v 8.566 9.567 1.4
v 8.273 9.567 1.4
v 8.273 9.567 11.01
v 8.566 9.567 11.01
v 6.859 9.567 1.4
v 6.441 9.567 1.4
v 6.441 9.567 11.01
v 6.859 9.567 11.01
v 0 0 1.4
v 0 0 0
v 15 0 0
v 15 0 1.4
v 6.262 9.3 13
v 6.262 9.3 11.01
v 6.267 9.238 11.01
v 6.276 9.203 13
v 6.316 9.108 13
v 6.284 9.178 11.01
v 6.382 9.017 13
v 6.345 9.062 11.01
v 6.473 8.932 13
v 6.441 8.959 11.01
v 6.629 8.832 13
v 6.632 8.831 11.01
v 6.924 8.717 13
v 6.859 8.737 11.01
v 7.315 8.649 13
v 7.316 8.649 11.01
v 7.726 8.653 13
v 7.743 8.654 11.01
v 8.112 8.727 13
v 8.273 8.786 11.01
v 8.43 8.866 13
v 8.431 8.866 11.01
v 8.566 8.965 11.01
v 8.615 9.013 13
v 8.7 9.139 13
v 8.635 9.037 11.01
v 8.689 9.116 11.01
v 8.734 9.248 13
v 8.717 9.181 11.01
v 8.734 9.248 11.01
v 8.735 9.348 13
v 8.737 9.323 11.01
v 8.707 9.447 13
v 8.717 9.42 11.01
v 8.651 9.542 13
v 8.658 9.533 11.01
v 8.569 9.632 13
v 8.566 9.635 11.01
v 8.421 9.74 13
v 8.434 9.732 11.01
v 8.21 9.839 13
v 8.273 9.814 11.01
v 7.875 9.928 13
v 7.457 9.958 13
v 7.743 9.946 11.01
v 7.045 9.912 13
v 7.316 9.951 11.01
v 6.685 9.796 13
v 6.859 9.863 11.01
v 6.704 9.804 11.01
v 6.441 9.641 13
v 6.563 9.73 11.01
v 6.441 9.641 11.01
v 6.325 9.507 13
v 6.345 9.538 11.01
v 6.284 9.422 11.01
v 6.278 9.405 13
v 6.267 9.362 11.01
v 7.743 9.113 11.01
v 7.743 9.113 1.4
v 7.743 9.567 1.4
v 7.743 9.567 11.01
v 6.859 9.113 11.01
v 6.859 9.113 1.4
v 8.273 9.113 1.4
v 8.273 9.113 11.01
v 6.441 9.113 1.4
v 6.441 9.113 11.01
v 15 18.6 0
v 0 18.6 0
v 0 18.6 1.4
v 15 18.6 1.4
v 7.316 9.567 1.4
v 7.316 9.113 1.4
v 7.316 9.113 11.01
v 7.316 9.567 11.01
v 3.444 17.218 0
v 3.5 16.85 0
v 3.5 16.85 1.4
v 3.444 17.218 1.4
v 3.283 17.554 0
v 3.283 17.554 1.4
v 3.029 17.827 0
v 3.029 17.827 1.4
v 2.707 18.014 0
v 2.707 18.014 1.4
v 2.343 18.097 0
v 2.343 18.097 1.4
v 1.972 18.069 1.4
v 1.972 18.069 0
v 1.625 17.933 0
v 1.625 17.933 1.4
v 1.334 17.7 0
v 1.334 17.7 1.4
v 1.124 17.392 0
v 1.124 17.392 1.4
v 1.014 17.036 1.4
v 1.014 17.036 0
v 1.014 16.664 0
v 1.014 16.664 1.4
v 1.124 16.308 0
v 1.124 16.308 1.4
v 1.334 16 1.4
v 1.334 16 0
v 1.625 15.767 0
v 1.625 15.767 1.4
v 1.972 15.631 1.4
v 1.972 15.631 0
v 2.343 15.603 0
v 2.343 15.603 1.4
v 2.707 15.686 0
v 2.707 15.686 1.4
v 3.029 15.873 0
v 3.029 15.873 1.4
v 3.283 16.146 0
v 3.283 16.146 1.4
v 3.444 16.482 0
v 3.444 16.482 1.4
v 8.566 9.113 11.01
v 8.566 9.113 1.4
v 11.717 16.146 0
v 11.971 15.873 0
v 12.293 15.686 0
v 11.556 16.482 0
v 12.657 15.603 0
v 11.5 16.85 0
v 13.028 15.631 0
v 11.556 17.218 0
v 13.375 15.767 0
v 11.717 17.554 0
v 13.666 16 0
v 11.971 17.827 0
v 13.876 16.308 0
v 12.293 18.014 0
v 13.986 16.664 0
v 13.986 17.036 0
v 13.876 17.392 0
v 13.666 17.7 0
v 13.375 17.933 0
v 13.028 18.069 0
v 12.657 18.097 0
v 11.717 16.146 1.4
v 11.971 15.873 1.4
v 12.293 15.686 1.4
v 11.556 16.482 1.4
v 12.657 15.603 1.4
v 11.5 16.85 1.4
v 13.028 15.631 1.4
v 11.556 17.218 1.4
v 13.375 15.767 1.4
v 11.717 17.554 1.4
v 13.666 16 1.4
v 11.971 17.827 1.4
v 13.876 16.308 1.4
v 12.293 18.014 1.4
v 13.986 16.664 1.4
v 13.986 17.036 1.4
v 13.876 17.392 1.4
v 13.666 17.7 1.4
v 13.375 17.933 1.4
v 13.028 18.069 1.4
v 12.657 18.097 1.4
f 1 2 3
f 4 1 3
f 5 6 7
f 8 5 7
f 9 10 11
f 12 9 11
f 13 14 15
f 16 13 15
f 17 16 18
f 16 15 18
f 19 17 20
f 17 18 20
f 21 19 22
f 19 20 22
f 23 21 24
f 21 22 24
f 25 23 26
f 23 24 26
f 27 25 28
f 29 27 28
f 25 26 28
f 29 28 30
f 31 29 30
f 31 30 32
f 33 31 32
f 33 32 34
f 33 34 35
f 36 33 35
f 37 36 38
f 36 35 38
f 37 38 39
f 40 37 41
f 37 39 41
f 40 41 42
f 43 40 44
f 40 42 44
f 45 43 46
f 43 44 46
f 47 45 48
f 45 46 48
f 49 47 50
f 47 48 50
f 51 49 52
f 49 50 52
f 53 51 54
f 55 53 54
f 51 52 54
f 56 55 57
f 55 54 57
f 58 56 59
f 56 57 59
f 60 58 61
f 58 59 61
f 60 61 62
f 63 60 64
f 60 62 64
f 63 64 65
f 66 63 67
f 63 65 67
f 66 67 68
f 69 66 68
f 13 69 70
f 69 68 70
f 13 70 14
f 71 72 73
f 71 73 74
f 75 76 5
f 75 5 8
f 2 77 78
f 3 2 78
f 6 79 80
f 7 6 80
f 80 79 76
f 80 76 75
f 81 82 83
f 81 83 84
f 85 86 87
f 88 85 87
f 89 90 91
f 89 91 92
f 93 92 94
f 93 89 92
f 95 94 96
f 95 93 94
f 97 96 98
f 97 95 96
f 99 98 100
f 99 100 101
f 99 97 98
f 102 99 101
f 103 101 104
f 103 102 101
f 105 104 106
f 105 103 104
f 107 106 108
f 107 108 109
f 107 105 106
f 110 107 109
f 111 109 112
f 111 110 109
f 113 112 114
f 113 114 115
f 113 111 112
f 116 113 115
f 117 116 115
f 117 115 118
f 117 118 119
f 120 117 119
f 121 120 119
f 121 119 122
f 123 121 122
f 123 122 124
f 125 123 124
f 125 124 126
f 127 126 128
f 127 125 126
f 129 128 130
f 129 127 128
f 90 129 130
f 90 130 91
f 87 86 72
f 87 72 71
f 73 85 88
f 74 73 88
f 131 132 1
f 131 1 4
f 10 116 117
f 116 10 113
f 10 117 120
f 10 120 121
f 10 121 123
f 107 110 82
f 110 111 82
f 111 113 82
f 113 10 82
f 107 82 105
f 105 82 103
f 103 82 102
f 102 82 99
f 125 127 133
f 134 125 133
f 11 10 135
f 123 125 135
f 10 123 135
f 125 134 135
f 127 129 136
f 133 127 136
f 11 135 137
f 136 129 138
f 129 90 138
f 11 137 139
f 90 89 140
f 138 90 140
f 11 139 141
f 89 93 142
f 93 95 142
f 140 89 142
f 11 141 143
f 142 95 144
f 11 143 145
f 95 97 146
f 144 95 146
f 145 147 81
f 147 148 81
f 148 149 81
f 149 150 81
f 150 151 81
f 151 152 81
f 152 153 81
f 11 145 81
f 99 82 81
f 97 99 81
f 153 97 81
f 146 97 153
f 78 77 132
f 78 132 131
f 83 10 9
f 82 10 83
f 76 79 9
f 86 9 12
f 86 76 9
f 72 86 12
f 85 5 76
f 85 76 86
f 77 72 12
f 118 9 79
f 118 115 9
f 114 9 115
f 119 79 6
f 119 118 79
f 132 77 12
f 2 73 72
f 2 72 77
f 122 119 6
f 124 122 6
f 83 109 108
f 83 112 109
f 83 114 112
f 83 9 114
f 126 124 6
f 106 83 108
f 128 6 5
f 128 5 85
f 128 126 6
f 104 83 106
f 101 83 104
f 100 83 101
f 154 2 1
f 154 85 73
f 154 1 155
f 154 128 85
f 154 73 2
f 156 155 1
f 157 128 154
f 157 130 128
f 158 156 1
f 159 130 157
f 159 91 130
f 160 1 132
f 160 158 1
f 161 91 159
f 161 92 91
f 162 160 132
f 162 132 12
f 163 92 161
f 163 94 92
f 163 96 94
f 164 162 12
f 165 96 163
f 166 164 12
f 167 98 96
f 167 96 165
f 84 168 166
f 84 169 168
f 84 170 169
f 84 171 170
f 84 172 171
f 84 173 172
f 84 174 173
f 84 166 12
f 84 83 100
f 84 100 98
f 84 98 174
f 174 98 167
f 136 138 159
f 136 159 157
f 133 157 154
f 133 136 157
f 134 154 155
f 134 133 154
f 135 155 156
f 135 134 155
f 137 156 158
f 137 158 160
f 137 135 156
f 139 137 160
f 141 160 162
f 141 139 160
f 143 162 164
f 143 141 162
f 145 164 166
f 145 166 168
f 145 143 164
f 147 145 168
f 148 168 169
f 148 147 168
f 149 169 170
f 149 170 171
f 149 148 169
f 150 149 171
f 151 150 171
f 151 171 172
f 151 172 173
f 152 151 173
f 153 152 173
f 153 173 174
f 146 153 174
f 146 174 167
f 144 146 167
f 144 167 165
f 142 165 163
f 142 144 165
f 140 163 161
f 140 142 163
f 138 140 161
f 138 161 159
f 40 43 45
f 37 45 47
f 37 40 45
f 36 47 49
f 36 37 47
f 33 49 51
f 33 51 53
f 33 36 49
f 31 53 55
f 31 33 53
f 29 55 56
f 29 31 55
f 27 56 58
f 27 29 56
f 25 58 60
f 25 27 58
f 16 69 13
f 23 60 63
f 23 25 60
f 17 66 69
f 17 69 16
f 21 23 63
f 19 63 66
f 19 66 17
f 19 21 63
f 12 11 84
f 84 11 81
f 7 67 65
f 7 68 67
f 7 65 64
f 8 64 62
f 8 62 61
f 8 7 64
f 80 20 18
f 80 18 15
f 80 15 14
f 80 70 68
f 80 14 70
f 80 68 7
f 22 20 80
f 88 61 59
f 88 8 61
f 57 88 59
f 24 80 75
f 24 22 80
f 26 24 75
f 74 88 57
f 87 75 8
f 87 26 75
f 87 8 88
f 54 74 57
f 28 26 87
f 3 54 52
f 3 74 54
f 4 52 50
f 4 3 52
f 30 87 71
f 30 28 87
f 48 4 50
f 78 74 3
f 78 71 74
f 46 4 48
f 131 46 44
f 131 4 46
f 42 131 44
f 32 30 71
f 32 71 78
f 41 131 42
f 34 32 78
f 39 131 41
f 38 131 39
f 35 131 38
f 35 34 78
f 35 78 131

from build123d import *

# Parameters (mm, degrees)
SKETCH1_W           = 15
SKETCH1_H           = 18.6
SKETCH1_R           = 1.25
BOSS_EXTRUDE1_DEPTH = 1.4
SKETCH3_RX          = 1.238007016
SKETCH3_RY          = 0.65851437
BOSS_EXTRUDE2_DEPTH = 11.6
SKETCH4_W           = 0.456640639
SKETCH4_H           = 9.610469394
SKETCH4_W_2         = 0.530038758
SKETCH4_W_3         = 2.48112331
SKETCH4_W_4         = 2.853524762
CUT_EXTRUDE1_DEPTH  = 18.6
CUT_EXTRUDE2_REACH  = 29.202
SKETCH5_W           = 9.610469394
SKETCH5_H           = 4.489024126
SKETCH5_H_2         = 2.452224348


with BuildPart() as part:
    # Sketch1 → Boss-Extrude1 (new body)
    with BuildSketch(Plane.XY):
        with Locations((7.5, 9.3)):
            Rectangle(SKETCH1_W, SKETCH1_H)
        with Locations((2.25, 16.85)):
            Circle(SKETCH1_R, mode=Mode.SUBTRACT)
        with Locations(Location((12.75, 16.85, 0), (0, 0, 180))):
            Circle(SKETCH1_R, mode=Mode.SUBTRACT)
    extrude(amount=BOSS_EXTRUDE1_DEPTH)

    # Sketch3 → Boss-Extrude2 (add)
    with BuildSketch(Plane.XY.offset(1.4)):
        with Locations(Location((7.5, 9.3), (0, 0, 180))):
            Ellipse(SKETCH3_RX, SKETCH3_RY)
    extrude(amount=BOSS_EXTRUDE2_DEPTH)

    # Sketch4 → Cut-Extrude1 (cut)
    with BuildSketch(Plane.XZ):
        with Locations((7.087370884, 6.205234697)):
            Rectangle(SKETCH4_W, SKETCH4_H)
        with Locations((8.008203946, 6.205234697)):
            Rectangle(SKETCH4_W_2, SKETCH4_H)
        with Locations((5.200227297, 6.205234697)):
            Rectangle(SKETCH4_W_3, SKETCH4_H)
        with Locations((9.992974241, 6.205234697)):
            Rectangle(SKETCH4_W_4, SKETCH4_H)
    extrude(amount=-CUT_EXTRUDE1_DEPTH, mode=Mode.SUBTRACT)

    # Cut-Extrude2: up to this face of the body (flat: up to its plane)
    cut_extrude2_end = Plane(part.part.faces().sort_by_distance((15, 9.3, 0.7))[0])
    # Sketch5 → Cut-Extrude2 (cut, up to the picked face)
    with BuildSketch(Plane.ZY, mode=Mode.PRIVATE) as cut_extrude2_sk1:
        with Locations((6.205234697, 11.811177541)):
            Rectangle(SKETCH5_W, SKETCH5_H)
    cut_extrude2_tool1 = split(extrude(cut_extrude2_sk1.sketch, amount=-CUT_EXTRUDE2_REACH, mode=Mode.PRIVATE), bisect_by=cut_extrude2_end, keep=Keep.BOTH, mode=Mode.PRIVATE)
    # Sketch5 → Cut-Extrude2 (cut, up to the picked face)
    with BuildSketch(Plane.ZY, mode=Mode.PRIVATE) as cut_extrude2_sk2:
        with Locations((6.205234697, 7.887207935)):
            Rectangle(SKETCH5_W, SKETCH5_H_2)
    cut_extrude2_tool2 = split(extrude(cut_extrude2_sk2.sketch, amount=-CUT_EXTRUDE2_REACH, mode=Mode.PRIVATE), bisect_by=cut_extrude2_end, keep=Keep.BOTH, mode=Mode.PRIVATE)
    add(cut_extrude2_tool1.solids().sort_by(Axis((0, 11.811178, 6.205235), (1, 0, 0)))[0], mode=Mode.SUBTRACT)
    add(cut_extrude2_tool2.solids().sort_by(Axis((0, 7.887208, 6.205235), (1, 0, 0)))[0], mode=Mode.SUBTRACT)


solid = part.part
